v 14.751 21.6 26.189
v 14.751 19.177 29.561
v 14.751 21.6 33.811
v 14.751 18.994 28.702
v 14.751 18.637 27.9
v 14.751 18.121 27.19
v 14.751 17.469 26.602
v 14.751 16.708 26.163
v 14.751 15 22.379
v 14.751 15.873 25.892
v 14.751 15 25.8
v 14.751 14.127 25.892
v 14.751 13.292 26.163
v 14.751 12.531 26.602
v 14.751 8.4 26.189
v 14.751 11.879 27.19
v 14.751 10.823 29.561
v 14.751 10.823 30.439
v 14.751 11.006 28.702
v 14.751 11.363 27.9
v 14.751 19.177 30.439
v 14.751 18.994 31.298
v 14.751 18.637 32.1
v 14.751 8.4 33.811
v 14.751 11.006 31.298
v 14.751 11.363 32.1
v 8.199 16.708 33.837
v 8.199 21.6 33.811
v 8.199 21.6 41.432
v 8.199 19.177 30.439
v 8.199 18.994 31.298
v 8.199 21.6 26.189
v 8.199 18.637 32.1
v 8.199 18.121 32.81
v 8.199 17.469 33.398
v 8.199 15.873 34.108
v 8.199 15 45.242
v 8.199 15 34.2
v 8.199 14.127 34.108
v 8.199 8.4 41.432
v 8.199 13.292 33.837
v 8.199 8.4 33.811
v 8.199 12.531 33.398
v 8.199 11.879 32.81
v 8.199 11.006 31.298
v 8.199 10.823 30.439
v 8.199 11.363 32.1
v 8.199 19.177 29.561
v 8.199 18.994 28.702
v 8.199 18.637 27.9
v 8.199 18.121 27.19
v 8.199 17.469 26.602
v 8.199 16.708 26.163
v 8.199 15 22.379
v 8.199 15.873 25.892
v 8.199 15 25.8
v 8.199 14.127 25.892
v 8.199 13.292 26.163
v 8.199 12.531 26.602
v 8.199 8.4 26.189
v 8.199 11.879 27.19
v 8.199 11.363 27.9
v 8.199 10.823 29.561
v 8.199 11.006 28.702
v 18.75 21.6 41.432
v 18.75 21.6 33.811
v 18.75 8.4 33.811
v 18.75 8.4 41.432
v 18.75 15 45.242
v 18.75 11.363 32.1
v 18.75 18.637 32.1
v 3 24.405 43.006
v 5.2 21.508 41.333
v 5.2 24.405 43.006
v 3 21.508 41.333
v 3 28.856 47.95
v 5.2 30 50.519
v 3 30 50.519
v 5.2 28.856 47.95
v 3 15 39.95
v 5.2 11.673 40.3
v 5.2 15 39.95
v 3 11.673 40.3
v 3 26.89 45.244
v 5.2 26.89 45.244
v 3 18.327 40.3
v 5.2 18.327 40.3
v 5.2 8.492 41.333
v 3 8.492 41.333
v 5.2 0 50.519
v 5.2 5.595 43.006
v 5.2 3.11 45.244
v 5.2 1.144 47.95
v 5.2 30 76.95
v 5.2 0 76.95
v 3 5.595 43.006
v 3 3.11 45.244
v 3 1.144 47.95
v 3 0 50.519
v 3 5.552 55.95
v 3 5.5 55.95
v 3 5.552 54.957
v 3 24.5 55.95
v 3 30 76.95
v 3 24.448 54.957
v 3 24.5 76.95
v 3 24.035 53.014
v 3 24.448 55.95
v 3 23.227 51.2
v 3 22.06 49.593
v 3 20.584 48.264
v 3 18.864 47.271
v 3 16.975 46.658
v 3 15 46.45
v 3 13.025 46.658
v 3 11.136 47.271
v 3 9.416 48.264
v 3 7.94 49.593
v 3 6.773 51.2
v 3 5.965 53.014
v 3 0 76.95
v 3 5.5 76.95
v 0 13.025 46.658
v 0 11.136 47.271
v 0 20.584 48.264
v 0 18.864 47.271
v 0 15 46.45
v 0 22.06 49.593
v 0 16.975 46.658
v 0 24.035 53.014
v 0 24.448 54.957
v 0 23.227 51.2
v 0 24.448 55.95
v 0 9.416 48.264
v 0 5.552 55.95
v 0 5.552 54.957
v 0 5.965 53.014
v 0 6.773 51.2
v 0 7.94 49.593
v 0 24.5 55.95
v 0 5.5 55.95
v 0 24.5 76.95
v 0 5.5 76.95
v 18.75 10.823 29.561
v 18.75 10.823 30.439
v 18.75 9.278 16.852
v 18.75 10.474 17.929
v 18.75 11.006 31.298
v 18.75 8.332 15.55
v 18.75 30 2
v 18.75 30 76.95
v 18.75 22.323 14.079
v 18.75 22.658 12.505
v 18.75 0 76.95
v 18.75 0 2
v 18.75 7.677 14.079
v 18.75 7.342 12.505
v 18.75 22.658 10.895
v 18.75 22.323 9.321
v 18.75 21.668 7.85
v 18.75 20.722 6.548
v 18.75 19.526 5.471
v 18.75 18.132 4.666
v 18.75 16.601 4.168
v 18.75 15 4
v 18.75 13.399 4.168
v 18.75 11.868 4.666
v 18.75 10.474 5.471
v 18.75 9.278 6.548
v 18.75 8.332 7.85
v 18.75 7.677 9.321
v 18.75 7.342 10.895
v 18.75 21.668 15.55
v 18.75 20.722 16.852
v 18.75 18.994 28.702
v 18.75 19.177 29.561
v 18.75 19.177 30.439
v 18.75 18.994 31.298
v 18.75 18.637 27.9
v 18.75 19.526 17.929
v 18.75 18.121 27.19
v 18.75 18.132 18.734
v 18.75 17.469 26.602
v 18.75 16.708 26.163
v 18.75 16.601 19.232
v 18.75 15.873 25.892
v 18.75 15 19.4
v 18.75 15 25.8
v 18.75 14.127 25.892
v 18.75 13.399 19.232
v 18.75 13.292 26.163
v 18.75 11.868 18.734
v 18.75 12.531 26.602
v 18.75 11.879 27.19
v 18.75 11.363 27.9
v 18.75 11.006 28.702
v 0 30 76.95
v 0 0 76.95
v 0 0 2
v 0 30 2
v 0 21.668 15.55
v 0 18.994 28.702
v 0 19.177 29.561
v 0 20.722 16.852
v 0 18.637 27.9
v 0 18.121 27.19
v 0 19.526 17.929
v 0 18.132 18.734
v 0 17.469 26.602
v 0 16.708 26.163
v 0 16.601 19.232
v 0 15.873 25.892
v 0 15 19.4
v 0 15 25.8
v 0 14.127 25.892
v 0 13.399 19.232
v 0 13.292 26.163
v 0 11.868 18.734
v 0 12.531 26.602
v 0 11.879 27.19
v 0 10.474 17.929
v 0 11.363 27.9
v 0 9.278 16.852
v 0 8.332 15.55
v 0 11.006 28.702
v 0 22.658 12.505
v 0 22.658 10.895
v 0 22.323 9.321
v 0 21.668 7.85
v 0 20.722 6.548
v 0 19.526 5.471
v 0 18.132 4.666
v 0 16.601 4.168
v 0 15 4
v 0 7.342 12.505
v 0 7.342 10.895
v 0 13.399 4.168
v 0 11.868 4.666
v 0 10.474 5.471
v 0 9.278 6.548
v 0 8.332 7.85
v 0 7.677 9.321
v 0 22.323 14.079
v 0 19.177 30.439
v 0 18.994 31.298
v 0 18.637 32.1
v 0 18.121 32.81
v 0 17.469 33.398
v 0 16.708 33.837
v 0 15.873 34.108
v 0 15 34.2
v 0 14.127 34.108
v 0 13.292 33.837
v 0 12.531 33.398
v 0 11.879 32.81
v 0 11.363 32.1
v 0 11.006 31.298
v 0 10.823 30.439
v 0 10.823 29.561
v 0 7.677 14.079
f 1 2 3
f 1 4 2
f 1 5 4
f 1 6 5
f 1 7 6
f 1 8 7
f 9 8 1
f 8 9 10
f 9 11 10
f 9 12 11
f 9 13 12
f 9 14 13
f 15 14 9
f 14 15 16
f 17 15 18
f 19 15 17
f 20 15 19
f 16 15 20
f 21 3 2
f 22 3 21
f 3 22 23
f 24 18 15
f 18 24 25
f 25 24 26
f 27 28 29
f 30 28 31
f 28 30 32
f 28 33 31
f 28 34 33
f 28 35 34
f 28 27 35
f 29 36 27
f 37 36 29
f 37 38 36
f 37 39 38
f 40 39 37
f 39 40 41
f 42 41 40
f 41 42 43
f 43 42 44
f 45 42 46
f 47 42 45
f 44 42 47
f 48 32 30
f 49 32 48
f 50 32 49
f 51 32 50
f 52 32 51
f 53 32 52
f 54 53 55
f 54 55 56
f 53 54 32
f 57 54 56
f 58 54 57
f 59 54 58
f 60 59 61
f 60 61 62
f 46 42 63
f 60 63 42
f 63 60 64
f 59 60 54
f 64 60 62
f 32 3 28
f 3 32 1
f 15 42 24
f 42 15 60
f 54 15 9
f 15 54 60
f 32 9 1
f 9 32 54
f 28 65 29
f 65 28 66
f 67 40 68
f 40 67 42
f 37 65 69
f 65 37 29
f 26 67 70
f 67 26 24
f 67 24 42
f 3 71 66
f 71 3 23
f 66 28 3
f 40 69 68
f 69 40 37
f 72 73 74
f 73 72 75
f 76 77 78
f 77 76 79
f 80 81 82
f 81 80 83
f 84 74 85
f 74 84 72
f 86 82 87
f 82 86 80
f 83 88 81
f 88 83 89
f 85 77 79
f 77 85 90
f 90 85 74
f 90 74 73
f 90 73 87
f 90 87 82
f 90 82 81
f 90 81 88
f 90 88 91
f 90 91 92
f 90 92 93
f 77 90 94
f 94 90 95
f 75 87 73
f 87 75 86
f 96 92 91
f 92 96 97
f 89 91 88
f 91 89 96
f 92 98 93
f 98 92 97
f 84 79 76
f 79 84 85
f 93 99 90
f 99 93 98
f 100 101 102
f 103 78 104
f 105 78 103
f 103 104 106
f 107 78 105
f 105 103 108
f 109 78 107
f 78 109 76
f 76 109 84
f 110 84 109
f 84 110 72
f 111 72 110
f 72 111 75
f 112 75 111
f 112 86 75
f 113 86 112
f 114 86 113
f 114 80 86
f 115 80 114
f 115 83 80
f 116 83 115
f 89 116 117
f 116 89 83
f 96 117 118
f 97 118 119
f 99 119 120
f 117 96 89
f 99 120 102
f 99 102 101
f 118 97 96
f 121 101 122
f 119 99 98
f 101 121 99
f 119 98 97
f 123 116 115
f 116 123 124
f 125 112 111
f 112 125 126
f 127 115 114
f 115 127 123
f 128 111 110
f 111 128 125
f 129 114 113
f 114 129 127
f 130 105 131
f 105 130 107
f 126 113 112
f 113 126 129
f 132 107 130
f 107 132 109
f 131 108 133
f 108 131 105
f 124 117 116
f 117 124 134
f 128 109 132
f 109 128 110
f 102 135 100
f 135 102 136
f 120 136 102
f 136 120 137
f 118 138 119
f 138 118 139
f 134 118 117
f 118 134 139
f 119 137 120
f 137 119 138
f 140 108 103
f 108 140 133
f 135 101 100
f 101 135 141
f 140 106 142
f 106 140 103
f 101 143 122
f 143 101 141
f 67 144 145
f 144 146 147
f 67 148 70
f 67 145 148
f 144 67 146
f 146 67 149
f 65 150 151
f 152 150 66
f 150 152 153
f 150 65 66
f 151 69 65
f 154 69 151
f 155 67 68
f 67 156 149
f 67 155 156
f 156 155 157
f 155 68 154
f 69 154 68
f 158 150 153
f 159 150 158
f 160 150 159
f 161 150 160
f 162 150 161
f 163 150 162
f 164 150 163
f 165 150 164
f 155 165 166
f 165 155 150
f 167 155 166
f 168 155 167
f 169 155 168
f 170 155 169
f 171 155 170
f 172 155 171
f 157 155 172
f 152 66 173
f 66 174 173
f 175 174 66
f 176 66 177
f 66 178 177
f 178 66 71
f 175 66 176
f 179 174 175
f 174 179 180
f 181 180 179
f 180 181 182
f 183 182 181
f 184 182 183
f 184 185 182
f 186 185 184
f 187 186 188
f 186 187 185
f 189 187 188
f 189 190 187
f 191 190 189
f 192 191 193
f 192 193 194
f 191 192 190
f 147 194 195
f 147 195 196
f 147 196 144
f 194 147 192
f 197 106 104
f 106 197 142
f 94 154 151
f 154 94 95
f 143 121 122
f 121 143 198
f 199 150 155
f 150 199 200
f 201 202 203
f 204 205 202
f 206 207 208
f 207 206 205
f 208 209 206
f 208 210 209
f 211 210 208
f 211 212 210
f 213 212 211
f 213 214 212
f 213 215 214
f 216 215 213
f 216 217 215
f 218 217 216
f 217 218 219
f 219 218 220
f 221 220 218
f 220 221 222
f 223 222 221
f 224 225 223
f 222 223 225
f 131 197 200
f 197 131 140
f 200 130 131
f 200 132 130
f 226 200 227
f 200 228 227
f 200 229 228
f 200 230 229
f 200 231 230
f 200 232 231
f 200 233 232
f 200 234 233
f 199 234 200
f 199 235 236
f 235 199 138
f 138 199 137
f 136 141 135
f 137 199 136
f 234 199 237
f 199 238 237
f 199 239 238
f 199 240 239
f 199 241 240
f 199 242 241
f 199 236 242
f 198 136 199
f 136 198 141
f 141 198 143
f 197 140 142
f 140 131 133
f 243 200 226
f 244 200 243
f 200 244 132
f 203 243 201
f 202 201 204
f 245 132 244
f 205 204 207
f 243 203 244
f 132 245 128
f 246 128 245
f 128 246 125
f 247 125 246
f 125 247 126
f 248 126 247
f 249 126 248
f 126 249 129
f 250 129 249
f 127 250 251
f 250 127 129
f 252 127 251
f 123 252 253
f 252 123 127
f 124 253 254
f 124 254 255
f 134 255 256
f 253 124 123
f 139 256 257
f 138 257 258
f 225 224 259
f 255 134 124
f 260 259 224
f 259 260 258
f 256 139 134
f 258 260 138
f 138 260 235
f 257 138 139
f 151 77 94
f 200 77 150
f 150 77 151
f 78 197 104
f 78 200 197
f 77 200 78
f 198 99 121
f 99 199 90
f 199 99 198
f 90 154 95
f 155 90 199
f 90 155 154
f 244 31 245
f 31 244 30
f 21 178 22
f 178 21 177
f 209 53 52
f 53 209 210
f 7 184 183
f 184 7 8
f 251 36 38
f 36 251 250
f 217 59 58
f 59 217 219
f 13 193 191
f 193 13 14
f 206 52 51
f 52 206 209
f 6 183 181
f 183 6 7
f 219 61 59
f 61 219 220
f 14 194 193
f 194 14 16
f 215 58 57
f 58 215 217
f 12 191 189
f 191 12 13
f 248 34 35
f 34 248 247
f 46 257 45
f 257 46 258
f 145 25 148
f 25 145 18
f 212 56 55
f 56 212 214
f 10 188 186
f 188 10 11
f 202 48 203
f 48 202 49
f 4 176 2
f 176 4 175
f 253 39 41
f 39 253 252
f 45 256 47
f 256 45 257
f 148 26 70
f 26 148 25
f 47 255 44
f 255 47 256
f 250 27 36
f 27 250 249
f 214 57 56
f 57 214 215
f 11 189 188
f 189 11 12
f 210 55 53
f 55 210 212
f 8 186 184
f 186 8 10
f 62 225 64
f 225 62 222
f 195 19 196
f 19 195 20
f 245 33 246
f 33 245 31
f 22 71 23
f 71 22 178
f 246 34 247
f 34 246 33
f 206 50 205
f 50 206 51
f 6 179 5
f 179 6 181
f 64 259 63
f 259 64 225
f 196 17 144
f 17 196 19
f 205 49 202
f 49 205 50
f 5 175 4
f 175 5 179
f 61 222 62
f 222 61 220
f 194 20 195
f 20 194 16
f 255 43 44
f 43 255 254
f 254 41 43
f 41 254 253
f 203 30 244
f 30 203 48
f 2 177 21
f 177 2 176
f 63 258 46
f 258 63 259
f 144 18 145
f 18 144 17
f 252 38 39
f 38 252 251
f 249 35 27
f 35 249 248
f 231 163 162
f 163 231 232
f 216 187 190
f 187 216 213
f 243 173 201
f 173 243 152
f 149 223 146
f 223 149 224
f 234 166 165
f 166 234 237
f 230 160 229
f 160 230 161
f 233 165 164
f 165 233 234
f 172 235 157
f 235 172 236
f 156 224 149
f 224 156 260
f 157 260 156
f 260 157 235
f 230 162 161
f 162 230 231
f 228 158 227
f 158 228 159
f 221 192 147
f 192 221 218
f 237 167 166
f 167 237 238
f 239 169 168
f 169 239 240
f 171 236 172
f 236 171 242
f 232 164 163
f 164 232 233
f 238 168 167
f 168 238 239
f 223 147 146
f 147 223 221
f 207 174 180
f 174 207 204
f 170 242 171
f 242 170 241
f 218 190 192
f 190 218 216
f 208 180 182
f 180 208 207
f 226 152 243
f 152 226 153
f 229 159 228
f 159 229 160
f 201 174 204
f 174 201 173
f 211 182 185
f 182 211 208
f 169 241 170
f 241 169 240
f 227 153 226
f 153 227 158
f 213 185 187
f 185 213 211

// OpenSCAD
// file: syringePumpConstants.scad
/* === Project-universal Constants === */

//Not all of these variables are used in this specific model,
//but the same variable set is used across all models in this project.

$fs = 0.1;

inch = 25.4; //for mm conversion

//width of base

// 8020 profile is 1 inch wide
//baseSizeY = 2*inch;
//screwPlateSize = 25;	
//screwRadius = 3.5;

// OpenBeam is 15mm wide
baseSizeY = 2*15;
screwPlateSize = 15;	
screwRadius = 1.5;

centerY = baseSizeY / 2; //both axes go right down the middle of the base

//stepper motor
stepperZSize = 42;
stepperYSize = 42;

//608 bearing 
bearing608Height = 8.5;
bearing608Diameter = 22.5;

//height of holder for 80/20 screws
mountPlateHeight = 5;

//axis heights
threadedAxisHeight = stepperZSize/2 + mountPlateHeight + 4;
echo("threadedAxisHeight ", threadedAxisHeight);
smoothAxisHeight = (threadedAxisHeight-6.6) / 2;
smoothRodRadius = 4.2;

//syringe properties
//barrelDiameter = 25;
//
//barrelSlotThickness = 3;
//barrelSlotHeight = 28;

// 20ml BD plastic disposable syringe REF 302830
barrelDiameter = 21.4;
barrelSlotThickness = 3;
barrelSlotHeight = 28;

syringeCenterHeight = threadedAxisHeight + bearing608Diameter/2 + 4 + barrelDiameter/2;

//fixes render oddities
floatCorrection = 0.001; 
floatCorrection2 = 2*floatCorrection; 
// main file
include <syringePumpConstants.scad>

/* === Model-specific Constants === */

//add some clearance, we don't want this against the 8020 rails
spaceAboveFloor = 2;

//plunger
plungerDiameter = 32;
plungerThickness = 2.2;
plungerInnerDiameter = 19;
plungerClipThickness = 3;
plungerWellDepth = plungerThickness + plungerClipThickness;

//trap nut
nutAcross = 13.2;
nutDepth = 6.5;
nutWellDepth = nutDepth + 0.05; //tight so it won't rattle
nutWallThicknessFront = plungerWellDepth+3;
nutWallThicknessBack = 4;

nutSlotSizeX = nutWallThicknessFront;
nutSlotSizeY = nutAcross;
nutSlotSizeZ = nutAcross/2;

//linear bearing 
LM8UU_dia = 15.4;
LM8UU_length = 24;

//cube containing nut, linear bearing, and plunger
mountXSize = nutWellDepth + nutWallThicknessFront + nutWallThicknessBack;
mountZSize = syringeCenterHeight + plungerDiameter/2 + 3;

/* === Model === */

//main cube, holds the two axes
difference(){
	translate([0,0,spaceAboveFloor]){
		cube(size=[mountXSize,baseSizeY,mountZSize]);
	}

	//nut
	translate([-floatCorrection+nutWallThicknessFront,centerY,threadedAxisHeight]){
		rotate(a=[0,90,0]){
			nutWell();
		}
		//nut insertion slot
		translate([0,0,nutAcross/sqrt(3)]){
			rotate(a=[0,90,0]){
				nutWell();
			}
		}
		translate([nutWellDepth,0,nutAcross/sqrt(3)]){
			rotate(a=[0,90,0]){
				nutWell();
			}
		}
	}

	
	//bore hole for threaded rod
	translate([-floatCorrection,centerY,threadedAxisHeight]){
		rotate(a=[0,90,0]){
			cylinder(h=mountXSize+floatCorrection2, r=smoothRodRadius);
		}
	}

	//hole for LM8UU
	translate([-floatCorrection,centerY,smoothAxisHeight]){
		rotate(a=[0,90,0]){
			bearingLM8UU();
		}
	}

	//U-shaped hole for syringe plunger to go in
	translate([plungerClipThickness,centerY,syringeCenterHeight]){
		rotate(a=[0,90,0]){
			cylinder(h=plungerThickness, r=plungerDiameter/2);
		}	
		translate([0,-plungerDiameter/2,0]){
			cube(size=[plungerThickness,plungerDiameter,mountZSize]);
		}
	}	
	translate([-floatCorrection,centerY,syringeCenterHeight]){
		rotate(a=[0,90,0]){
			cylinder(h=plungerClipThickness+floatCorrection2, r=plungerInnerDiameter/2);
		}	
		translate([0,-plungerInnerDiameter/2,0]){
			cube(size=[plungerClipThickness+floatCorrection2,plungerInnerDiameter,mountZSize]);
		}
	}	
	
	
	//remove excess volume from sides
	translate([-floatCorrection,centerY+plungerDiameter/2 + 4,0]){
		cube(size=[mountXSize + floatCorrection2, baseSizeY, mountZSize+spaceAboveFloor]);
	}	
	cube(size=[mountXSize + floatCorrection2, centerY-plungerDiameter/2-4, mountZSize+spaceAboveFloor]);
}




module nutWell(){
	//compose the outline of the 6-sided nut using 3 cubes. Yay geometry.
	nutEdgeLength = nutAcross / (sqrt(3));
	
	translate([-nutEdgeLength/2, -nutAcross/2, 0]){
		cube(size=[nutEdgeLength,nutAcross,nutWellDepth+floatCorrection2]);
	}

		rotate(a=[0,0,60]){
			translate([-nutEdgeLength/2, -nutAcross/2, 0]){
				cube(size=[nutEdgeLength,nutAcross,nutWellDepth+floatCorrection2]);
			}
		}
	
		rotate(a=[0,0,-60]){
			translate([-nutEdgeLength/2, -nutAcross/2, 0]){
				cube(size=[nutEdgeLength,nutAcross,nutWellDepth+floatCorrection2]);
			}
		}
}

module bearingLM8UU(){
	cylinder(h=LM8UU_length, r=LM8UU_dia/2);
}
